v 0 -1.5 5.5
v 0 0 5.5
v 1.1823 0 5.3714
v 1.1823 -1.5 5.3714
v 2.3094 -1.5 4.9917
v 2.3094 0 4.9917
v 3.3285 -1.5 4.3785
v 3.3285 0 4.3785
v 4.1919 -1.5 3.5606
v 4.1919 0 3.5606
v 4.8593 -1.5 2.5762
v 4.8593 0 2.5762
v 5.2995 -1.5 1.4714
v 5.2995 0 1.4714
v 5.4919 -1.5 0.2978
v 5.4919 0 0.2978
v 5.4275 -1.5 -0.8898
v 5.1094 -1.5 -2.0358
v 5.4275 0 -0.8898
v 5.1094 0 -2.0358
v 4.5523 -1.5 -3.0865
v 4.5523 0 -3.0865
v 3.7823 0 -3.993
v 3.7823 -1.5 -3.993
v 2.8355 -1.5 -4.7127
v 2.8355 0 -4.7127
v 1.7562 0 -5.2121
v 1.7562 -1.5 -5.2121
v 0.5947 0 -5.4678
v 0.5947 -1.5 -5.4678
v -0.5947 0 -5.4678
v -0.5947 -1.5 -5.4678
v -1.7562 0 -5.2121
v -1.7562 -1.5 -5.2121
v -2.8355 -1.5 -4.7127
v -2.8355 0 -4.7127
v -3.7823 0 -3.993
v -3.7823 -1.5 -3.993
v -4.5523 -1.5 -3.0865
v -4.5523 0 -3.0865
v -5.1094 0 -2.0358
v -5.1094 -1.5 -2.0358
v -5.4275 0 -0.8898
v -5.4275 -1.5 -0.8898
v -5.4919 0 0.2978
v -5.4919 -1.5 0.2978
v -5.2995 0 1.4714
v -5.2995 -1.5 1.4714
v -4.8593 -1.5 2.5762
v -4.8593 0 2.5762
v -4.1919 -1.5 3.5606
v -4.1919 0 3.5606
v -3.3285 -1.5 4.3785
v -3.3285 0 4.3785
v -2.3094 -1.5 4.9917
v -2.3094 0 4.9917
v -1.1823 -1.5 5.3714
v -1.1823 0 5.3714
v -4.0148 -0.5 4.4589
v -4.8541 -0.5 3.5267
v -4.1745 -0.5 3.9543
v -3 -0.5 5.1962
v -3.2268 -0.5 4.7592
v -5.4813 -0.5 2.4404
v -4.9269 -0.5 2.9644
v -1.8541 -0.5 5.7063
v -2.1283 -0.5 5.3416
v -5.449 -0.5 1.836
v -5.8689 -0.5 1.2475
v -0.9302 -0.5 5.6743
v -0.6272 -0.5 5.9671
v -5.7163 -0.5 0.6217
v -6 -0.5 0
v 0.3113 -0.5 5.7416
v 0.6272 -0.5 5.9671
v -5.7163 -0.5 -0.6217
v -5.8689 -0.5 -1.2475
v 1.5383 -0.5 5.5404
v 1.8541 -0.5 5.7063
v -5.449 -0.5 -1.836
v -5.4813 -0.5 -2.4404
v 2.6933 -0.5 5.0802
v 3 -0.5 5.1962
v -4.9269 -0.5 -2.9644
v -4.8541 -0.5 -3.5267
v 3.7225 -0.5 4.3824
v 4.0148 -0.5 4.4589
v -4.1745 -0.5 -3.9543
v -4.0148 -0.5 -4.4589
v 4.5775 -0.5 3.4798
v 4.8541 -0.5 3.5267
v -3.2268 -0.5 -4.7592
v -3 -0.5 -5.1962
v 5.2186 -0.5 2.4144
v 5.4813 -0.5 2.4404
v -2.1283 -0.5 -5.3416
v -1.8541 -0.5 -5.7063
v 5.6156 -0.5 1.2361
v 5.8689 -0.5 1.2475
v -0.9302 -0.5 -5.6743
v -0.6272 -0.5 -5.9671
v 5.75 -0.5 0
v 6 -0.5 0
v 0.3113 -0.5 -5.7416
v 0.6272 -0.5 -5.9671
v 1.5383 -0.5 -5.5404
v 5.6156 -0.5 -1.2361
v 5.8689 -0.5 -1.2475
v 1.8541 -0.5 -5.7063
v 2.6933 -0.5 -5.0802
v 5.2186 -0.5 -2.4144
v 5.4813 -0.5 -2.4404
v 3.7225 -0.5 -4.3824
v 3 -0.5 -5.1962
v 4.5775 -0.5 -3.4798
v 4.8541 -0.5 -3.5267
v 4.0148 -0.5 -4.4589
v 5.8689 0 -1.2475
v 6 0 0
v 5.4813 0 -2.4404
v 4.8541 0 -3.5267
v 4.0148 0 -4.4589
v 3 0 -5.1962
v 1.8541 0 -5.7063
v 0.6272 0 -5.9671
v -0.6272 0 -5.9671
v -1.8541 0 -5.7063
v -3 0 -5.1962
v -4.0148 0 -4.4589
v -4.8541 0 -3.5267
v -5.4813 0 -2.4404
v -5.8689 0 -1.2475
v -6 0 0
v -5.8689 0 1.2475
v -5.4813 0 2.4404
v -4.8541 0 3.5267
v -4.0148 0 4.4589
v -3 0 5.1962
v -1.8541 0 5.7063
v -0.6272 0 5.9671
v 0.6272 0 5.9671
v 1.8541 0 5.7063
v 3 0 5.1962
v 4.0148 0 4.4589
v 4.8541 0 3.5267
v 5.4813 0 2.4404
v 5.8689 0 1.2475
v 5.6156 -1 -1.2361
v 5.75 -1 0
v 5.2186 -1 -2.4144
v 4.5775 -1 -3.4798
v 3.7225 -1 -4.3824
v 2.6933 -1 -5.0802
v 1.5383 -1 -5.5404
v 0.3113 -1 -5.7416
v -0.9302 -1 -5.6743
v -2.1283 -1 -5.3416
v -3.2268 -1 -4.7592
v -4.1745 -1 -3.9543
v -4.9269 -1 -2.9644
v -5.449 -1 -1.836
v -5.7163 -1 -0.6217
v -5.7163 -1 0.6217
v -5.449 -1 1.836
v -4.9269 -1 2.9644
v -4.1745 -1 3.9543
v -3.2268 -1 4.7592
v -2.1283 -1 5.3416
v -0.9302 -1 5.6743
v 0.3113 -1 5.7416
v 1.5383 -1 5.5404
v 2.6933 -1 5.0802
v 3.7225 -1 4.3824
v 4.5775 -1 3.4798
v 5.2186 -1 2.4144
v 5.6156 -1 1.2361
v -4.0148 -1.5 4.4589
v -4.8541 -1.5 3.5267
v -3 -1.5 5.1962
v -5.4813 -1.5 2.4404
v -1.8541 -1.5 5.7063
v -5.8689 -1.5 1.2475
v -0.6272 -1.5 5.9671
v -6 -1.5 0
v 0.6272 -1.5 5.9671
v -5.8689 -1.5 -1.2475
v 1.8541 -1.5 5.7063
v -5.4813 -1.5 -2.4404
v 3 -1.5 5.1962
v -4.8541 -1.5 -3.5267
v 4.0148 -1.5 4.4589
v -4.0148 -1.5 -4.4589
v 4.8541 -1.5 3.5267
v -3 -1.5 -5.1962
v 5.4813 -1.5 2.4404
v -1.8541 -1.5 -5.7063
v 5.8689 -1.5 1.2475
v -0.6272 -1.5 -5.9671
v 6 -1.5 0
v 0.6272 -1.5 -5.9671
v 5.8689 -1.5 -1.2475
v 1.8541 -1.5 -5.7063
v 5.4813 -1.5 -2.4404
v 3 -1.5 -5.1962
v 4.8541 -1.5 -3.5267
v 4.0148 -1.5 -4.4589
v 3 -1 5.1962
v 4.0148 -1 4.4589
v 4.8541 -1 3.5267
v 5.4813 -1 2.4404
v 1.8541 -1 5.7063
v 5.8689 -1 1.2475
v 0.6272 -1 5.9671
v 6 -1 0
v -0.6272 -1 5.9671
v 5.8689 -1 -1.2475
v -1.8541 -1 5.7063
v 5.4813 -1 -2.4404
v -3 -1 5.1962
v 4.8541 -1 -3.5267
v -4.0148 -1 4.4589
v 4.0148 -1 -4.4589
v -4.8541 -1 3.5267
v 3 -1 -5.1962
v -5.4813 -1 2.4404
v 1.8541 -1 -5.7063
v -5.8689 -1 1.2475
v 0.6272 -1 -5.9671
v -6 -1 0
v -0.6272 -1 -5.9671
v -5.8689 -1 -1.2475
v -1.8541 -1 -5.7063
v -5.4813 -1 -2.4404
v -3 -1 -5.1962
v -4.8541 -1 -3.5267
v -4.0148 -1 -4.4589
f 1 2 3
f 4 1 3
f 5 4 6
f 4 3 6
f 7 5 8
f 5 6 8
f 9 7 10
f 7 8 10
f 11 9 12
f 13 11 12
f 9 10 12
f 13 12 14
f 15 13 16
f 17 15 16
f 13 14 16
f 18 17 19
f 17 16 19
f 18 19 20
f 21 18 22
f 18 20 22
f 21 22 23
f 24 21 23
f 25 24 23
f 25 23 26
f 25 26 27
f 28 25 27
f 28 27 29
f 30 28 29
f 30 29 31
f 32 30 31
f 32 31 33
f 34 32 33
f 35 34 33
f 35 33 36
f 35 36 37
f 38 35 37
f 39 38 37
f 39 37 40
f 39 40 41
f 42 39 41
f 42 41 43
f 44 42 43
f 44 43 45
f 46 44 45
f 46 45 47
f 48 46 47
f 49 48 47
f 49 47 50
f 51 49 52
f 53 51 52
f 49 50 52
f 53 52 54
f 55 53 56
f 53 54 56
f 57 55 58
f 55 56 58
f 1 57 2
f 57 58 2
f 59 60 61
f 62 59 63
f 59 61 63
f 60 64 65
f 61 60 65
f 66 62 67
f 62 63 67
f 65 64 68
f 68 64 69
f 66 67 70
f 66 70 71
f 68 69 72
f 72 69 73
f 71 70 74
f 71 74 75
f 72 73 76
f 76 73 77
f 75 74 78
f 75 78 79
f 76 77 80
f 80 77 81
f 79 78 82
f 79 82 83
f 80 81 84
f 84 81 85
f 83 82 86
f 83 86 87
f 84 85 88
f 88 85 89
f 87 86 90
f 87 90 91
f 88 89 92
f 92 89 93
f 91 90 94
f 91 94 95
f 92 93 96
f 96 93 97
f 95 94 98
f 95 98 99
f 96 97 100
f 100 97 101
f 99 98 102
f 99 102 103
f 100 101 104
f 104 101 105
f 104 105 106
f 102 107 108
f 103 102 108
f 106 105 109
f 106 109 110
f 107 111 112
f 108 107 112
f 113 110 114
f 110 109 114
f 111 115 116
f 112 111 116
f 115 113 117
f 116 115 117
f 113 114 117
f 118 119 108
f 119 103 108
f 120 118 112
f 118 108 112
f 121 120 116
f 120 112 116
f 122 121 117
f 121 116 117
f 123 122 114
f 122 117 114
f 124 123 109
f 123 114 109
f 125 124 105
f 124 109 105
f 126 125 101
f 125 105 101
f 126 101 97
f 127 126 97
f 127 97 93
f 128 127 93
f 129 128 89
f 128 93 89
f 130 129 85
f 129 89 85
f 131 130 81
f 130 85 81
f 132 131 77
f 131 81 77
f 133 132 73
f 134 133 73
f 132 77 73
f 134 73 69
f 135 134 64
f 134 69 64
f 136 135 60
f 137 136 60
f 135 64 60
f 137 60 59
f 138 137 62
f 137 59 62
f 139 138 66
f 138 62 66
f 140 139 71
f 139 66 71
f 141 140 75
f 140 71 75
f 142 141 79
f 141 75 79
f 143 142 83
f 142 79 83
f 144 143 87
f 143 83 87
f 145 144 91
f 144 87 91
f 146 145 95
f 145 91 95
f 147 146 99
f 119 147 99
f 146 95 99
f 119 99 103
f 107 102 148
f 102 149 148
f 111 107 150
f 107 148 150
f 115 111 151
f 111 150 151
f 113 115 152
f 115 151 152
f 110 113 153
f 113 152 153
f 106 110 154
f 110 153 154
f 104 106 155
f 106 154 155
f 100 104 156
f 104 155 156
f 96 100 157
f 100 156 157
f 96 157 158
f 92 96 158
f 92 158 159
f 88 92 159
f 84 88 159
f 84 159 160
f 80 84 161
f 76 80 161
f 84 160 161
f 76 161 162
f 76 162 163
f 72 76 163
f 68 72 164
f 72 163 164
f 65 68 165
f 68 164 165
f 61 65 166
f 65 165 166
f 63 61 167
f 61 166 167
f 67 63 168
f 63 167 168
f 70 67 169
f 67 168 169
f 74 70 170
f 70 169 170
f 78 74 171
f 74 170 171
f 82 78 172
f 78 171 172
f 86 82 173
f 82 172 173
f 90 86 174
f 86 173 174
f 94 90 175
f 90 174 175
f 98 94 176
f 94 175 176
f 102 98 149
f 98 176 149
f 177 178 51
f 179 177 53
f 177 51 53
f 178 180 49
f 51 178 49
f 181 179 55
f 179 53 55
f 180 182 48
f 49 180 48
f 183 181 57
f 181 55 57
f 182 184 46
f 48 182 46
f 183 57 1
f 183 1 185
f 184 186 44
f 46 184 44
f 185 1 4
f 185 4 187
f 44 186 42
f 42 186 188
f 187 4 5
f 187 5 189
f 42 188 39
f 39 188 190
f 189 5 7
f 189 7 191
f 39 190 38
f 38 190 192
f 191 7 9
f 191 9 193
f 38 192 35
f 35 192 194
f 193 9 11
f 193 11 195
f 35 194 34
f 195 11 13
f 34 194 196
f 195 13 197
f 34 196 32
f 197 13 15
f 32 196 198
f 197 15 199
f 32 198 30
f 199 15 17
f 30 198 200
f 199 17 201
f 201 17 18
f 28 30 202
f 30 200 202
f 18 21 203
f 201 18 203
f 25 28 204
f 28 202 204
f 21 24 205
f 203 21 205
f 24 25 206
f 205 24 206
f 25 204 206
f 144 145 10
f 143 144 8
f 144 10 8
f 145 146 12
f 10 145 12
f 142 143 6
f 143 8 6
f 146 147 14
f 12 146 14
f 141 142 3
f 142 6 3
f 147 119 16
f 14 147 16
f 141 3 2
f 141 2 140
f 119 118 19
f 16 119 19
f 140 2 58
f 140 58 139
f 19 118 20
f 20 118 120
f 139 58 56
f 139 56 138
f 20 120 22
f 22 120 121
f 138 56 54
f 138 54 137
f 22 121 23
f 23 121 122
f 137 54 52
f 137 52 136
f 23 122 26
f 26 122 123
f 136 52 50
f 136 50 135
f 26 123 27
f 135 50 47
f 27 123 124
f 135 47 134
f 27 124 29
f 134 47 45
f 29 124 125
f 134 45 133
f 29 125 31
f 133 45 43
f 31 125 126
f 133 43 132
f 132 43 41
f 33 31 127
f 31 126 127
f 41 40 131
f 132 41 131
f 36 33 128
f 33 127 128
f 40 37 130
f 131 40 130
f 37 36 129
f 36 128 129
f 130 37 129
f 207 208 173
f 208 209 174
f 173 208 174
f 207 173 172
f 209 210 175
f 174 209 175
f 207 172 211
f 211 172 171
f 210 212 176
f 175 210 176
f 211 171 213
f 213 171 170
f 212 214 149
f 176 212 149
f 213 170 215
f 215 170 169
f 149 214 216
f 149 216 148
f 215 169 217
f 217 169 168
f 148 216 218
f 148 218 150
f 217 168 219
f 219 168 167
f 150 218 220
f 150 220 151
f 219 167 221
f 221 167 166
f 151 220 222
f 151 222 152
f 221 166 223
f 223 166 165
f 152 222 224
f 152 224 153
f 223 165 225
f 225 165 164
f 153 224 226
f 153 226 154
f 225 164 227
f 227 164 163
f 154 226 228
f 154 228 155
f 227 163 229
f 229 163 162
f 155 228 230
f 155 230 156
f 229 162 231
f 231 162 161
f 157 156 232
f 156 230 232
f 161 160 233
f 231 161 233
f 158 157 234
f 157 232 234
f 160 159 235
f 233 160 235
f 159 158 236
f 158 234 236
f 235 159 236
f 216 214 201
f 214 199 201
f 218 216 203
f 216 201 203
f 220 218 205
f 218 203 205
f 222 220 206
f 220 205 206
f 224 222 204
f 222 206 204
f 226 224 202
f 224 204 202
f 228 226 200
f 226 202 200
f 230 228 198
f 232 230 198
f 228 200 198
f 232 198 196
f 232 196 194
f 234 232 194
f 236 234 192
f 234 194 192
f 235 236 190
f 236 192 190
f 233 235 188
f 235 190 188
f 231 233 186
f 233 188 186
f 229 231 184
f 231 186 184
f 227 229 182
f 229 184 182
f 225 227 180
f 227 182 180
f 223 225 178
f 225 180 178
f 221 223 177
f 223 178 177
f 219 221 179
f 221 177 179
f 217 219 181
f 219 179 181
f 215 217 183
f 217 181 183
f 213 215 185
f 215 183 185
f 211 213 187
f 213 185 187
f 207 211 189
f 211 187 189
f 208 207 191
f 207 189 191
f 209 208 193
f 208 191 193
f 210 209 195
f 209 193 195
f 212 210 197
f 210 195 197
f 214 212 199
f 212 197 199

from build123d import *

# Parameters (mm, degrees)
CROQUIS1_R            = 5.5
CORTAR_EXTRUIR1_DEPTH = 10


with BuildPart() as part:
    # Croquis2 → Revolución1 (revolve)
    with BuildSketch(Plane.XY):
        Polygon((0, 0), (6, 0), (6, -0.5), (5.75, -0.5), (5.75, -1), (6, -1), (6, -1.5), (0, -1.5), align=None)
    revolve(axis=Axis((0, -1.5, 0), (0, 1, 0)))

    # Croquis1 → Cortar-Extruir1 (cut)
    with BuildSketch(Plane(origin=(0, 0, 0), x_dir=(1, 0, 0), z_dir=(0, 1, 0))):
        with Locations(Location((0, 0, 0), (0, 0, 270))):
            Circle(CROQUIS1_R)
    extrude(amount=-CORTAR_EXTRUIR1_DEPTH, mode=Mode.SUBTRACT)


solid = part.part
